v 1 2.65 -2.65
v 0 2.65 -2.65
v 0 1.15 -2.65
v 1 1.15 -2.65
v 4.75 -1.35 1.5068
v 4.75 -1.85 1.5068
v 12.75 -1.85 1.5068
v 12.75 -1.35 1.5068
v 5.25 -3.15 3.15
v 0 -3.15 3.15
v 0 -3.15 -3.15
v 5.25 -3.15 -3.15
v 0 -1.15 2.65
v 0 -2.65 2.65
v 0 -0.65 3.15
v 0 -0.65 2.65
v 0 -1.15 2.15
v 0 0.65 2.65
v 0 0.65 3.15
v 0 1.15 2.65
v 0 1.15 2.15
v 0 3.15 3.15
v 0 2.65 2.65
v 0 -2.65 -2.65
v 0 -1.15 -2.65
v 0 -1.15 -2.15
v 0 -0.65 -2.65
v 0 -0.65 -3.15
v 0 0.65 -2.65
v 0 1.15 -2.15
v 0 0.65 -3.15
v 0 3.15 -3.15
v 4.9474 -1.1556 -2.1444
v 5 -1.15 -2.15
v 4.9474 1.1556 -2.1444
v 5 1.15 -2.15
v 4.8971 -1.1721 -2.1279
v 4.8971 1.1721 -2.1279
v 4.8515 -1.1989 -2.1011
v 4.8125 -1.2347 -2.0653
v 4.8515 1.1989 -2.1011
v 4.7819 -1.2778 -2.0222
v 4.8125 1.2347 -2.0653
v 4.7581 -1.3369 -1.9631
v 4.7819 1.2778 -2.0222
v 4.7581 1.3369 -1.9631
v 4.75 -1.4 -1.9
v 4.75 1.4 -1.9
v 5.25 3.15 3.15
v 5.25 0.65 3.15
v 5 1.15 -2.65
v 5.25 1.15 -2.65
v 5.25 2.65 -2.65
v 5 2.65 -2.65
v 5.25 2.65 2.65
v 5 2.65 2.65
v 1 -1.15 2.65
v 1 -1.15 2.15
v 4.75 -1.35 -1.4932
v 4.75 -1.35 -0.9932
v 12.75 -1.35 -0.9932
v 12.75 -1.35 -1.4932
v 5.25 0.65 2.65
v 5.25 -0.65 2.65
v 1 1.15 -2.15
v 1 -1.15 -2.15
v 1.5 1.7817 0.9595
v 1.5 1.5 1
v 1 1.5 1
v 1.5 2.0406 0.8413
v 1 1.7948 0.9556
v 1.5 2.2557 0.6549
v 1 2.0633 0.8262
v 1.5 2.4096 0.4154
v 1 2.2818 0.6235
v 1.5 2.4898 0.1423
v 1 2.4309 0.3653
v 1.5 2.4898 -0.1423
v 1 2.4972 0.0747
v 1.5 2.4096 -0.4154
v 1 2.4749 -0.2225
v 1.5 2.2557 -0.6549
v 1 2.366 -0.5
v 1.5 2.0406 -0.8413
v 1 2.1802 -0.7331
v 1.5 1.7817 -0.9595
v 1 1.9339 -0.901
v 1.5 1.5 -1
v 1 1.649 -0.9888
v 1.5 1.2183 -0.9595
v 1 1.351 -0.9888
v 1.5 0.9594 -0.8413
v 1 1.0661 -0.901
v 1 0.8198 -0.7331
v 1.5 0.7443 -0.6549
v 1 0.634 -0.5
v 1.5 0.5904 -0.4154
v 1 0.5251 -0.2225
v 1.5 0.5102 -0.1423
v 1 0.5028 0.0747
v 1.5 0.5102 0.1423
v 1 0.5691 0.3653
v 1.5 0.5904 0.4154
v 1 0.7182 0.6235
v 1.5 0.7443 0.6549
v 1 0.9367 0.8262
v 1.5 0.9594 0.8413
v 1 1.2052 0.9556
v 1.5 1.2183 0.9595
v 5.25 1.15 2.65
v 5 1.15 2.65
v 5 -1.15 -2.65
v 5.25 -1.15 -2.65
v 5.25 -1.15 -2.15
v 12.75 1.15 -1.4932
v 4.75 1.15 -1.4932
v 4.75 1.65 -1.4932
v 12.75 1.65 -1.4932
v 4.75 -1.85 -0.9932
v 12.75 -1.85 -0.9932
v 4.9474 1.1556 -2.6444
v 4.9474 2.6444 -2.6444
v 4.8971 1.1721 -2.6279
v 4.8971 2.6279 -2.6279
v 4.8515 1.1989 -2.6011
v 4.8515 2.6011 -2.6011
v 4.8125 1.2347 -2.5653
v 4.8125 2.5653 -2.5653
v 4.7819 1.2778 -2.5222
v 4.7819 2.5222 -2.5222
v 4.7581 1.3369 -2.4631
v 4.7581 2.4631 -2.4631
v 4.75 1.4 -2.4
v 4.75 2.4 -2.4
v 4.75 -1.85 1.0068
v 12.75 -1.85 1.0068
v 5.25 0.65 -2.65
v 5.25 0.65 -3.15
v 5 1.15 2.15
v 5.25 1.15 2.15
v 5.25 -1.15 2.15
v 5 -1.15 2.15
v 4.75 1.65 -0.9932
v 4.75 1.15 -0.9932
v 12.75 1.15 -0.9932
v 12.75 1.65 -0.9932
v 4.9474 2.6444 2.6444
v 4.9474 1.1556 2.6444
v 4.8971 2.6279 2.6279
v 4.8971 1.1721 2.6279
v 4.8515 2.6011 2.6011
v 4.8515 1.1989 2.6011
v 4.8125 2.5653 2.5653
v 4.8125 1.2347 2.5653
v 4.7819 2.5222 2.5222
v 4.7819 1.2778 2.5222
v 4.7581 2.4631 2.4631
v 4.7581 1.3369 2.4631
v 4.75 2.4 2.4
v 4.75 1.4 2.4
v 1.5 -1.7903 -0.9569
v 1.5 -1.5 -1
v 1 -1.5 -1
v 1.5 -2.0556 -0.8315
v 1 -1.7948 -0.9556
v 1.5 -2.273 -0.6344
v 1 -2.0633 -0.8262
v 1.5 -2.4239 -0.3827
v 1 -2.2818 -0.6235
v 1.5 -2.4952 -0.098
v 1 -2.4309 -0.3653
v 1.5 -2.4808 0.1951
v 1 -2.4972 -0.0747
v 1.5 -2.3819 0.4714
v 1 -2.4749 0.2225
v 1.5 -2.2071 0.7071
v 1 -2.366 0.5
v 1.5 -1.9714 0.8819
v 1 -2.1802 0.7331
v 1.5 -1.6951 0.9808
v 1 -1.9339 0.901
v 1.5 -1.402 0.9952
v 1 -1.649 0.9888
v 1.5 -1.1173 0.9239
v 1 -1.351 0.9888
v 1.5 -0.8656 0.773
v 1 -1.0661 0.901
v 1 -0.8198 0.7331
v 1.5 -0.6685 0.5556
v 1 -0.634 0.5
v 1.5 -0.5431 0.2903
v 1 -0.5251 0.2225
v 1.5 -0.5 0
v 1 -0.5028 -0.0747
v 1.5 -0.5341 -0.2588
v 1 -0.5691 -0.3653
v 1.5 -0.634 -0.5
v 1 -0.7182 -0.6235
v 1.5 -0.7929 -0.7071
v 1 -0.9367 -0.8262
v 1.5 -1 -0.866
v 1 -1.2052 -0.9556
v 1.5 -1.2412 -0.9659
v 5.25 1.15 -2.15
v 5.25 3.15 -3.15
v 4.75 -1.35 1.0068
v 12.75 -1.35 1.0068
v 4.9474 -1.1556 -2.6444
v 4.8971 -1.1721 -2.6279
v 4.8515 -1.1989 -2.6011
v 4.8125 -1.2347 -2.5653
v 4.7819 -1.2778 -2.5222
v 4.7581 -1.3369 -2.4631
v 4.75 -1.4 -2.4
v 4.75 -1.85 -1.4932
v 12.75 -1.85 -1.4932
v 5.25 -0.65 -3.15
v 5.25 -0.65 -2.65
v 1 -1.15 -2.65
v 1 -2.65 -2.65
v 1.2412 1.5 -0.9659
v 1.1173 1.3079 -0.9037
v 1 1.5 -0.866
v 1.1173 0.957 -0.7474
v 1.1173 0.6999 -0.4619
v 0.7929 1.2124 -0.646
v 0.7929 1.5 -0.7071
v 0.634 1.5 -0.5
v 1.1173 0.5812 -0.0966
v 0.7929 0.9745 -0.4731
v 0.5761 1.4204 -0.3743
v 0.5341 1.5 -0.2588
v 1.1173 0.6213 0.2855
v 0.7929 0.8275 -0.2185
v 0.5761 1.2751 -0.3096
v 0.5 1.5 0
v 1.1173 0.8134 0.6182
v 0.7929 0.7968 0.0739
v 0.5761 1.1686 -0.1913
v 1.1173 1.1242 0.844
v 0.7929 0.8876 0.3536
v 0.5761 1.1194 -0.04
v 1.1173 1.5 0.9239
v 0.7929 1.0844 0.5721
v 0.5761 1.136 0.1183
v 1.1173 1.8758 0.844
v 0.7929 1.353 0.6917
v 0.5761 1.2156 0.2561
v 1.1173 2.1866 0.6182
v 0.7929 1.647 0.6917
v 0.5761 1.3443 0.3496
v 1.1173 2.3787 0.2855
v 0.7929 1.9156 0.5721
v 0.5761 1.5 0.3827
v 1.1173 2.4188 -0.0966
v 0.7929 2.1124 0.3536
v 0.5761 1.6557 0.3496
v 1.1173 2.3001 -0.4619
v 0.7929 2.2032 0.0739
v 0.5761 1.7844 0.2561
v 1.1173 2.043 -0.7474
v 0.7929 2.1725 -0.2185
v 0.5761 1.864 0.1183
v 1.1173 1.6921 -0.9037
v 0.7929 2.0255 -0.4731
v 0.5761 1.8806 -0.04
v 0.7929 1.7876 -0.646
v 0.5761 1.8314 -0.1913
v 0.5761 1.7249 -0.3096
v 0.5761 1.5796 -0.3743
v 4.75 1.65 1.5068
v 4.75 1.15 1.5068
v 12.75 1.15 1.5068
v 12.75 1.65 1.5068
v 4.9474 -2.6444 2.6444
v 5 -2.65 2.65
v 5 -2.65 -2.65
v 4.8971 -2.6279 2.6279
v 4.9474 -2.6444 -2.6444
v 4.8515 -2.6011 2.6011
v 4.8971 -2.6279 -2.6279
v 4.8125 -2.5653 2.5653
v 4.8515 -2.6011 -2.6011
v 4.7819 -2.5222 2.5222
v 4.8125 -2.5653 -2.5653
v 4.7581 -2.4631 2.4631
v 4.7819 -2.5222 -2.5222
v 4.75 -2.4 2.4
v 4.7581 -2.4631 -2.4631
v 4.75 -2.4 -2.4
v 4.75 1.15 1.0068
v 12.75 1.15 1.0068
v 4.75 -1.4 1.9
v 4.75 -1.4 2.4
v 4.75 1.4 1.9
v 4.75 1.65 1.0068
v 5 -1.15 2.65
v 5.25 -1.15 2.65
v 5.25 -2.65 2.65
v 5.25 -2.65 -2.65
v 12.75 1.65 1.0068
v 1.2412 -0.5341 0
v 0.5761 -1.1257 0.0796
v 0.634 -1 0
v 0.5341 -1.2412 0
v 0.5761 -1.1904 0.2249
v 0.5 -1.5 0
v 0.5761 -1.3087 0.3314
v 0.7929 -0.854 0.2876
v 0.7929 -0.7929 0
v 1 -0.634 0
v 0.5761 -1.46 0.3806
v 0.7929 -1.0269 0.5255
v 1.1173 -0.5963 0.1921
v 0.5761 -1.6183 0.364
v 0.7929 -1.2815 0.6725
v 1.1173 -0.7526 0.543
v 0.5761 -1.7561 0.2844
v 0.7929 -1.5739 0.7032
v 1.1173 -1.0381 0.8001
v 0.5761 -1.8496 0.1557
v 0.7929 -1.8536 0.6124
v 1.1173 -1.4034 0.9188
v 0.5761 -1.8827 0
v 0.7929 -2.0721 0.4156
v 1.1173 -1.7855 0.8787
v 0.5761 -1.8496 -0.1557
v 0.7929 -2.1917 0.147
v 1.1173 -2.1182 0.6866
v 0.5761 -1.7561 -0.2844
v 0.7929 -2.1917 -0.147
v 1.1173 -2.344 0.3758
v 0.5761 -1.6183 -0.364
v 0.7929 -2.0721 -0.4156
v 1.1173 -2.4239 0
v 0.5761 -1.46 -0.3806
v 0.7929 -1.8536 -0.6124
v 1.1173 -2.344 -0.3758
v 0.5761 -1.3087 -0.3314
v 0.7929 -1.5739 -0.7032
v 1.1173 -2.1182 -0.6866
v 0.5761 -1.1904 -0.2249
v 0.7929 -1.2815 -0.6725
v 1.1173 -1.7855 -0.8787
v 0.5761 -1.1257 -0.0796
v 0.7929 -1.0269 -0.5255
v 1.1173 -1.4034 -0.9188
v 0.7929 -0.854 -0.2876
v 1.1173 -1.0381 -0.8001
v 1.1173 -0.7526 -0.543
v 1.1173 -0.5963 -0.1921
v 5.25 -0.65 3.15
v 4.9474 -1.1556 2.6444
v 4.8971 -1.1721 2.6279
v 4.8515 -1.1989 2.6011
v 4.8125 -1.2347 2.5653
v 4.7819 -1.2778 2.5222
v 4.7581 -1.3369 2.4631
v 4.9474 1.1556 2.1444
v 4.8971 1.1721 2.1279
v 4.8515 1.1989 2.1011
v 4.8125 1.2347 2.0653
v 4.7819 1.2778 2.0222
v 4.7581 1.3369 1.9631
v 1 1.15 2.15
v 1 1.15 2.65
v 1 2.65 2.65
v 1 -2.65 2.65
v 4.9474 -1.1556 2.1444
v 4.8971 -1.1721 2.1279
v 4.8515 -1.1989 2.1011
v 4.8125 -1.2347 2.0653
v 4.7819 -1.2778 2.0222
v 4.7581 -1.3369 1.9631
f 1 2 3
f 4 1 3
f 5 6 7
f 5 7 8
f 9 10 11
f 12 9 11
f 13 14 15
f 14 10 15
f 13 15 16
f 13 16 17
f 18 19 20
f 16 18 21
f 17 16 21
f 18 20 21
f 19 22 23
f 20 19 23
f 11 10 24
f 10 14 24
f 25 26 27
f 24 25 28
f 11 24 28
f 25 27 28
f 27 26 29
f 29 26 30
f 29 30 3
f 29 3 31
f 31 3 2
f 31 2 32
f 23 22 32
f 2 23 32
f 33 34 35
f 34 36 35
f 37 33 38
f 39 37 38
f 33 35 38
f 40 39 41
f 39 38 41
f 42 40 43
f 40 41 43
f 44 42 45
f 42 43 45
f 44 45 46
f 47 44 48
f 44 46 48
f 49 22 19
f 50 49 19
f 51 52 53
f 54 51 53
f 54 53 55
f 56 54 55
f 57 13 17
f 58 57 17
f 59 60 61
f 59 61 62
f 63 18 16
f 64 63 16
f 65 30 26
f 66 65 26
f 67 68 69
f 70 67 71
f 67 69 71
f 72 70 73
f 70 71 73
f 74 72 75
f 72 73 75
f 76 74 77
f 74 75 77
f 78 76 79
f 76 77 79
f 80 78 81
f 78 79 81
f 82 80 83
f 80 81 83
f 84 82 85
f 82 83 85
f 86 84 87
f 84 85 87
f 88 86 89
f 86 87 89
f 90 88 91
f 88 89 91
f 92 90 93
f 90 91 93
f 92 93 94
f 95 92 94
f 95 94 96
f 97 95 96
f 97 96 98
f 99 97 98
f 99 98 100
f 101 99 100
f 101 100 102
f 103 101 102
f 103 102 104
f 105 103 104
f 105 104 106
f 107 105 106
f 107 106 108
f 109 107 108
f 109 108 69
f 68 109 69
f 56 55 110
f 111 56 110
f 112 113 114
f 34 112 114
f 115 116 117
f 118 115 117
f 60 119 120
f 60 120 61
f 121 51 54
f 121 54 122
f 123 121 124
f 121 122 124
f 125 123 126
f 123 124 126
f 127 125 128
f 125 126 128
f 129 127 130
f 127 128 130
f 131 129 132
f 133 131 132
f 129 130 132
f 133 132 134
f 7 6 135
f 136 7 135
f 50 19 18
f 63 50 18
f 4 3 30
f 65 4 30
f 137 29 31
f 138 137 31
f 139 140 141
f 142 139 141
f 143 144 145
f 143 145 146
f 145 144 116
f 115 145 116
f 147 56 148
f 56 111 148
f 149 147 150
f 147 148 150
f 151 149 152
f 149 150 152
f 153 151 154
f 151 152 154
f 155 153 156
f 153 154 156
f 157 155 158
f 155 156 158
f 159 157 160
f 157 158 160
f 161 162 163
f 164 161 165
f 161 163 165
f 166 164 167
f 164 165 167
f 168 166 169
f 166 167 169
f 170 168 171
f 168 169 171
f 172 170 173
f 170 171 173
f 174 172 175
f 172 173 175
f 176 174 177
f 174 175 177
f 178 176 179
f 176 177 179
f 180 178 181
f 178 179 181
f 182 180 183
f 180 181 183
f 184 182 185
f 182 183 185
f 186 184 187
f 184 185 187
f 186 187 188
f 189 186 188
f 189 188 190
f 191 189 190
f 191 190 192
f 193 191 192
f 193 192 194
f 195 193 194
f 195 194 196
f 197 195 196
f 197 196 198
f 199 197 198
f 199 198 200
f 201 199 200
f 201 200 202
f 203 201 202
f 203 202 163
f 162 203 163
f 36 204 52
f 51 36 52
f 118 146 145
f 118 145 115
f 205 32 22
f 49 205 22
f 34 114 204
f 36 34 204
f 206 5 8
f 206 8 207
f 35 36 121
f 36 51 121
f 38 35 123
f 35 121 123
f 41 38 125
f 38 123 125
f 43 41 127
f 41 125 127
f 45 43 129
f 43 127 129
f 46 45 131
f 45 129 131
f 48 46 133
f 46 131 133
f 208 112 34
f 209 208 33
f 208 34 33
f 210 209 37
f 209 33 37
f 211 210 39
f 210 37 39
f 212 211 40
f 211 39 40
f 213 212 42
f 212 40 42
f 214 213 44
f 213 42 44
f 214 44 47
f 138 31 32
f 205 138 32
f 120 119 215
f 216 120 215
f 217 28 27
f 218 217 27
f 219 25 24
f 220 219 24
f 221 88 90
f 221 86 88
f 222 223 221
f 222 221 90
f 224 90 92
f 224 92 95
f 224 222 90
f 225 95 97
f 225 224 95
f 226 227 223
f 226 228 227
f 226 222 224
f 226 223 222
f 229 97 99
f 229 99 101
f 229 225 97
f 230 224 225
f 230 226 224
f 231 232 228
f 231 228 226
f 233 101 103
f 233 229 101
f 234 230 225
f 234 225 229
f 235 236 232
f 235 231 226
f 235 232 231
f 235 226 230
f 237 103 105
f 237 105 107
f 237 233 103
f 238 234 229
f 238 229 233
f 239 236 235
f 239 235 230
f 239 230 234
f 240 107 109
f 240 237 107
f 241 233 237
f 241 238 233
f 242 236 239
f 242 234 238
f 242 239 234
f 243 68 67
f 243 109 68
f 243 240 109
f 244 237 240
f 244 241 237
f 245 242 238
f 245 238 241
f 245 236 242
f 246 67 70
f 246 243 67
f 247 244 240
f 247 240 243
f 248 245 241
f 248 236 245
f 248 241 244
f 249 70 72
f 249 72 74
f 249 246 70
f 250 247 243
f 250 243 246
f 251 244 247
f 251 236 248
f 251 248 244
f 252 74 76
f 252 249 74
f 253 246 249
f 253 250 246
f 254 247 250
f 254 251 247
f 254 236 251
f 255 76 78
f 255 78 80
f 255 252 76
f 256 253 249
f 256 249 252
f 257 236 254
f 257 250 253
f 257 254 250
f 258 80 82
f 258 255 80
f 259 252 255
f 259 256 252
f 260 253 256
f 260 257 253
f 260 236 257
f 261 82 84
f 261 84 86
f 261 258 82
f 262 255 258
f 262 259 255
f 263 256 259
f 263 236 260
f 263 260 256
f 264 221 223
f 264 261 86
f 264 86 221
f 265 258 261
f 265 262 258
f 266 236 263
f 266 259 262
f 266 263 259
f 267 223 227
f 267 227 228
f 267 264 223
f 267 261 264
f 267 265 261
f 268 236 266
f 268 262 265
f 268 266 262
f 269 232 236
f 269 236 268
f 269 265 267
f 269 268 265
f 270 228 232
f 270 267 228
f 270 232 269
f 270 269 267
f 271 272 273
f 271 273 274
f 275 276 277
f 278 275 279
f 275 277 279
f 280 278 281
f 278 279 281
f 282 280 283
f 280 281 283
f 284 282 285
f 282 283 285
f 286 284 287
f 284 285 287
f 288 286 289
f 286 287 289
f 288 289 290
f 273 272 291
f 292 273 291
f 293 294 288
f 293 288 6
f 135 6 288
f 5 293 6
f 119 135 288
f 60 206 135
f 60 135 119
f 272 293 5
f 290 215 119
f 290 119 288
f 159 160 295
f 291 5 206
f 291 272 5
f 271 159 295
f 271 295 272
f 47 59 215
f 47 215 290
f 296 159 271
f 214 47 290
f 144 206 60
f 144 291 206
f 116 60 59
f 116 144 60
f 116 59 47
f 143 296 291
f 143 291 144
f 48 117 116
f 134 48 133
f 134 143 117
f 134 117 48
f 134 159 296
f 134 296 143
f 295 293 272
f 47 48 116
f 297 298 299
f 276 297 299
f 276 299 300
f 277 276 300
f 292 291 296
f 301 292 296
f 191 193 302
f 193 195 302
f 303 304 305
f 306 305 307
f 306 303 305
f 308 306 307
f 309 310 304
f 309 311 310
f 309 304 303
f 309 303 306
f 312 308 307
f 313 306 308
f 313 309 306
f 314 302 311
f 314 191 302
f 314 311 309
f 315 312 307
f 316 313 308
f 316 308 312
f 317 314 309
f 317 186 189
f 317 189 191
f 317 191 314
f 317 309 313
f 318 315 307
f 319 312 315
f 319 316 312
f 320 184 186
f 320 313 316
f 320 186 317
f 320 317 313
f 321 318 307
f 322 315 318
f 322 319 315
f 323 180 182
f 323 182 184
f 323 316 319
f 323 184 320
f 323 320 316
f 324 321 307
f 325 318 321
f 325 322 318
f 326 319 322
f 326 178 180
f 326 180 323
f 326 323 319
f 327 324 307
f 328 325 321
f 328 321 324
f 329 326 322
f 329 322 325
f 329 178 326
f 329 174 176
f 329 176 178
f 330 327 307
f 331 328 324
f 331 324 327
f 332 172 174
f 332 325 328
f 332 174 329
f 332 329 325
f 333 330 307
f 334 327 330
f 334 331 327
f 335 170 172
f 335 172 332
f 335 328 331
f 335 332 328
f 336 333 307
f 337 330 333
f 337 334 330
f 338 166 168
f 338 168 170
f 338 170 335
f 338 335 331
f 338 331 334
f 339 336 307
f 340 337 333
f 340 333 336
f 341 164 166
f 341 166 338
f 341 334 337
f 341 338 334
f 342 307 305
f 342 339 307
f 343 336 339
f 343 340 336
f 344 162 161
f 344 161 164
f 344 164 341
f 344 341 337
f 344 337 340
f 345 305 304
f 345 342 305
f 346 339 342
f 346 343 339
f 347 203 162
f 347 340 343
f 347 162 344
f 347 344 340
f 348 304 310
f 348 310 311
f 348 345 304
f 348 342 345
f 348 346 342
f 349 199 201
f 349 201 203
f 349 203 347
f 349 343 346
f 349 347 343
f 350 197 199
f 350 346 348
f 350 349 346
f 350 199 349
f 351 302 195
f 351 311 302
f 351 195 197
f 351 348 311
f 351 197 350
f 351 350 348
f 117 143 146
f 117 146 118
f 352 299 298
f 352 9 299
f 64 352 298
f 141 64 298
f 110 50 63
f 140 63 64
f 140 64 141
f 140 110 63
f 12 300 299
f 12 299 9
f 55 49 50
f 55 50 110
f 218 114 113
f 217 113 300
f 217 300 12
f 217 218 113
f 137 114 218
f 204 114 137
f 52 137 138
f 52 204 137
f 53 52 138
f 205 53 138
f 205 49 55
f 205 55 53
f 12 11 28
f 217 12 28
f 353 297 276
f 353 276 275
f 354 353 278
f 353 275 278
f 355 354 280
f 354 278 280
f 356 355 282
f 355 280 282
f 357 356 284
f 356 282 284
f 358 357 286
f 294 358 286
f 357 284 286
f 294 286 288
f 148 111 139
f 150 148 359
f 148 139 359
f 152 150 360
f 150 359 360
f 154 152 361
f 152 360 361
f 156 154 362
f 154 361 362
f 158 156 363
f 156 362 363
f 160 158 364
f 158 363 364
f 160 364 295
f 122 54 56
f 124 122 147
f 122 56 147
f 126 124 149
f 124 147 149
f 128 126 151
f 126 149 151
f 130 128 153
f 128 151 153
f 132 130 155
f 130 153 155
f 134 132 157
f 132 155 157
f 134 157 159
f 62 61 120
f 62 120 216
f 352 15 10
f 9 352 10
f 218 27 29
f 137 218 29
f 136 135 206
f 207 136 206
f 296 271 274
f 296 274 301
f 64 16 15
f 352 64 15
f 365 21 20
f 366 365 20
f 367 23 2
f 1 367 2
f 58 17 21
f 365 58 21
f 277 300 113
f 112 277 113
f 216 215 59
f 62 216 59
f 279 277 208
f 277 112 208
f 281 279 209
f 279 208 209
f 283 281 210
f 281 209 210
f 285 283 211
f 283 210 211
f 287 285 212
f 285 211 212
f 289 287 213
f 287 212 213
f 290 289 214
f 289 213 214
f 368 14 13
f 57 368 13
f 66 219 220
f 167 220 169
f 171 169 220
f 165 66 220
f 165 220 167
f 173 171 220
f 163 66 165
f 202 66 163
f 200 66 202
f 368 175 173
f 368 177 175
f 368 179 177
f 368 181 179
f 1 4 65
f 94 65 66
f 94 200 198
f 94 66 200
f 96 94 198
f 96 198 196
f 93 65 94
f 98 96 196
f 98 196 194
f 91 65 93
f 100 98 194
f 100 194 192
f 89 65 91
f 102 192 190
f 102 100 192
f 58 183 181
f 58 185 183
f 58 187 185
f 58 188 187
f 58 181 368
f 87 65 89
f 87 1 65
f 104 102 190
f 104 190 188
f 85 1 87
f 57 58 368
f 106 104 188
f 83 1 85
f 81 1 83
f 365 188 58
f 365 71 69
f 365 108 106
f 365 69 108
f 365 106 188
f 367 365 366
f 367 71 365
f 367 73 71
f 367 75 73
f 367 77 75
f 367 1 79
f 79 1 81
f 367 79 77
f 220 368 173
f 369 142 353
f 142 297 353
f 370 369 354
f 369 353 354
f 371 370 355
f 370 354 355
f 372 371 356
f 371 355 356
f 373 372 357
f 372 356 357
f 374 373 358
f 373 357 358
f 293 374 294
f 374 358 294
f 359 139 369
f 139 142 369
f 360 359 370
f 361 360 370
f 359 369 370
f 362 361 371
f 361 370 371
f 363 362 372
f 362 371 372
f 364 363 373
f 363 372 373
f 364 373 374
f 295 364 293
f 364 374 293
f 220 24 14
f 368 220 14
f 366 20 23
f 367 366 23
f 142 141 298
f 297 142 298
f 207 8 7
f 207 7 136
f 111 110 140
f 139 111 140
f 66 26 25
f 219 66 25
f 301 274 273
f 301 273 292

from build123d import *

# Parameters (mm, degrees)
SALIENTE_EXTRUIR1_DEPTH = 5.25
CORTAR_EXTRUIR1_DEPTH   = 1
CORTAR_EXTRUIR2_DEPTH   = 0.5
REDONDEO1_R             = 0.25
CROQUIS4_W              = 0.5
CROQUIS4_H              = 0.5
SALIENTE_EXTRUIR2_DEPTH = 8
CROQUIS5_R              = 1
CORTAR_EXTRUIR3_DEPTH   = 0.5
C_PULA1_FACE_RADIUS     = 1
C_PULA1_HEIGHT          = 1


# Read off the part's stored shape, not the designer's step: Cúpula2
with BuildPart() as part:
    # Croquis2 → Saliente-Extruir1 (new body)
    with BuildSketch(Plane(origin=(0, 0, 0), x_dir=(0, 0, -1), z_dir=(1, 0, 0))):
        Polygon((-3.15, -3.15), (3.15, -3.15), (3.15, -0.65), (2.65, -0.65), (2.65, 0.65), (3.15, 0.65), (3.15, 3.15), (-3.15, 3.15), (-3.15, 0.65), (-2.65, 0.65), (-2.65, -0.65), (-3.15, -0.65), align=None)
    extrude(amount=SALIENTE_EXTRUIR1_DEPTH)

    # Croquis2<4> → Cortar-Extruir1 (cut)
    with BuildSketch(Plane(origin=(0, 0, 0), x_dir=(0, 0, -1), z_dir=(1, 0, 0))):
        Polygon((-2.65, -2.65), (-2.65, -1.15), (-2.15, -1.15), (-2.15, 1.15), (-2.65, 1.15), (-2.65, 2.65), (2.65, 2.65), (2.65, 1.15), (2.15, 1.15), (2.15, -1.15), (2.65, -1.15), (2.65, -2.65), align=None)
    extrude(amount=CORTAR_EXTRUIR1_DEPTH, mode=Mode.SUBTRACT)

    # Croquis3 → Cortar-Extruir2 (cut)
    with BuildSketch(Plane(origin=(5.25, 0, 0), x_dir=(0, 0, -1), z_dir=(1, 0, 0))):
        Polygon((2.65, 1.15), (2.65, 2.65), (-2.65, 2.65), (-2.65, 1.15), (-2.15, 1.15), (-2.15, -1.15), (-2.65, -1.15), (-2.65, -2.65), (2.65, -2.65), (2.65, -1.15), (2.15, -1.15), (2.15, 1.15), align=None)
    extrude(amount=-CORTAR_EXTRUIR2_DEPTH, mode=Mode.SUBTRACT)

    # Redondeo1
    redondeo1_edges = [part.edges().sort_by_distance(p)[0] for p in [
        (4.75, 1.9, -2.65),
        (4.75, 1.15, -2.4),
        (4.75, 0, -2.15),
        (4.75, -1.15, -2.4),
        (4.75, -1.9, -2.65),
        (4.75, -2.65, 0),
        (4.75, -1.9, 2.65),
        (4.75, -1.15, 2.4),
        (4.75, 0, 2.15),
        (4.75, 1.15, 2.4),
        (4.75, 1.9, 2.65),
        (4.75, 2.65, 0),
    ]]
    fillet(redondeo1_edges, radius=REDONDEO1_R)

    # Croquis4 → Saliente-Extruir2 (add)
    with BuildSketch(Plane(origin=(4.75, 0, 0), x_dir=(0, 0, -1), z_dir=(1, 0, 0))):
        with Locations((-1.256816684, 1.4)):
            Rectangle(CROQUIS4_W, CROQUIS4_H)
        with Locations((1.243183316, 1.4)):
            Rectangle(CROQUIS4_W, CROQUIS4_H)
        with Locations((1.243183316, -1.6)):
            Rectangle(CROQUIS4_W, CROQUIS4_H)
        with Locations((-1.256816684, -1.6)):
            Rectangle(CROQUIS4_W, CROQUIS4_H)
    extrude(amount=SALIENTE_EXTRUIR2_DEPTH)

    # Croquis5 → Cortar-Extruir3 (cut)
    with BuildSketch(Plane.ZY.offset(-1)):
        with Locations((0, 1.5)):
            Circle(CROQUIS5_R)
        with Locations(Location((0, -1.5, 0), (0, 0, 180))):
            Circle(CROQUIS5_R)
    extrude(amount=-CORTAR_EXTRUIR3_DEPTH, mode=Mode.SUBTRACT)

    # Cúpula1: a dome of height H over a round flat face of radius A is a cap of a sphere of radius (A * A + H * H) / (2 * H)
    c_pula1_r = (C_PULA1_FACE_RADIUS * C_PULA1_FACE_RADIUS + C_PULA1_HEIGHT * C_PULA1_HEIGHT) / (2 * C_PULA1_HEIGHT)
    c_pula1_base = Plane((1.5, 1.5, 0), z_dir=(-1, 0, 0))
    with Locations(c_pula1_base.offset(C_PULA1_HEIGHT - c_pula1_r)):
        c_pula1_ball = Sphere(c_pula1_r, mode=Mode.PRIVATE)
    add(split(c_pula1_ball, bisect_by=c_pula1_base, keep=Keep.TOP, mode=Mode.PRIVATE))

    # Cúpula2 outline → Cúpula2 (revolve)
    with BuildSketch(Plane(origin=(0, -1.5, 0), x_dir=(0, 1, 0), z_dir=(0, 0, -1))):
        with BuildLine():
            Line((0, 1.500000001), (0, 0.5))
            ThreePointArc((0, 0.5), (0.707106782, 0.792893219), (1, 1.500000001))
            Line((1, 1.500000001), (0, 1.500000001))
        make_face()
    revolve(axis=Axis((0, -1.5, 0), (1, 0, 0)))


solid = part.part
